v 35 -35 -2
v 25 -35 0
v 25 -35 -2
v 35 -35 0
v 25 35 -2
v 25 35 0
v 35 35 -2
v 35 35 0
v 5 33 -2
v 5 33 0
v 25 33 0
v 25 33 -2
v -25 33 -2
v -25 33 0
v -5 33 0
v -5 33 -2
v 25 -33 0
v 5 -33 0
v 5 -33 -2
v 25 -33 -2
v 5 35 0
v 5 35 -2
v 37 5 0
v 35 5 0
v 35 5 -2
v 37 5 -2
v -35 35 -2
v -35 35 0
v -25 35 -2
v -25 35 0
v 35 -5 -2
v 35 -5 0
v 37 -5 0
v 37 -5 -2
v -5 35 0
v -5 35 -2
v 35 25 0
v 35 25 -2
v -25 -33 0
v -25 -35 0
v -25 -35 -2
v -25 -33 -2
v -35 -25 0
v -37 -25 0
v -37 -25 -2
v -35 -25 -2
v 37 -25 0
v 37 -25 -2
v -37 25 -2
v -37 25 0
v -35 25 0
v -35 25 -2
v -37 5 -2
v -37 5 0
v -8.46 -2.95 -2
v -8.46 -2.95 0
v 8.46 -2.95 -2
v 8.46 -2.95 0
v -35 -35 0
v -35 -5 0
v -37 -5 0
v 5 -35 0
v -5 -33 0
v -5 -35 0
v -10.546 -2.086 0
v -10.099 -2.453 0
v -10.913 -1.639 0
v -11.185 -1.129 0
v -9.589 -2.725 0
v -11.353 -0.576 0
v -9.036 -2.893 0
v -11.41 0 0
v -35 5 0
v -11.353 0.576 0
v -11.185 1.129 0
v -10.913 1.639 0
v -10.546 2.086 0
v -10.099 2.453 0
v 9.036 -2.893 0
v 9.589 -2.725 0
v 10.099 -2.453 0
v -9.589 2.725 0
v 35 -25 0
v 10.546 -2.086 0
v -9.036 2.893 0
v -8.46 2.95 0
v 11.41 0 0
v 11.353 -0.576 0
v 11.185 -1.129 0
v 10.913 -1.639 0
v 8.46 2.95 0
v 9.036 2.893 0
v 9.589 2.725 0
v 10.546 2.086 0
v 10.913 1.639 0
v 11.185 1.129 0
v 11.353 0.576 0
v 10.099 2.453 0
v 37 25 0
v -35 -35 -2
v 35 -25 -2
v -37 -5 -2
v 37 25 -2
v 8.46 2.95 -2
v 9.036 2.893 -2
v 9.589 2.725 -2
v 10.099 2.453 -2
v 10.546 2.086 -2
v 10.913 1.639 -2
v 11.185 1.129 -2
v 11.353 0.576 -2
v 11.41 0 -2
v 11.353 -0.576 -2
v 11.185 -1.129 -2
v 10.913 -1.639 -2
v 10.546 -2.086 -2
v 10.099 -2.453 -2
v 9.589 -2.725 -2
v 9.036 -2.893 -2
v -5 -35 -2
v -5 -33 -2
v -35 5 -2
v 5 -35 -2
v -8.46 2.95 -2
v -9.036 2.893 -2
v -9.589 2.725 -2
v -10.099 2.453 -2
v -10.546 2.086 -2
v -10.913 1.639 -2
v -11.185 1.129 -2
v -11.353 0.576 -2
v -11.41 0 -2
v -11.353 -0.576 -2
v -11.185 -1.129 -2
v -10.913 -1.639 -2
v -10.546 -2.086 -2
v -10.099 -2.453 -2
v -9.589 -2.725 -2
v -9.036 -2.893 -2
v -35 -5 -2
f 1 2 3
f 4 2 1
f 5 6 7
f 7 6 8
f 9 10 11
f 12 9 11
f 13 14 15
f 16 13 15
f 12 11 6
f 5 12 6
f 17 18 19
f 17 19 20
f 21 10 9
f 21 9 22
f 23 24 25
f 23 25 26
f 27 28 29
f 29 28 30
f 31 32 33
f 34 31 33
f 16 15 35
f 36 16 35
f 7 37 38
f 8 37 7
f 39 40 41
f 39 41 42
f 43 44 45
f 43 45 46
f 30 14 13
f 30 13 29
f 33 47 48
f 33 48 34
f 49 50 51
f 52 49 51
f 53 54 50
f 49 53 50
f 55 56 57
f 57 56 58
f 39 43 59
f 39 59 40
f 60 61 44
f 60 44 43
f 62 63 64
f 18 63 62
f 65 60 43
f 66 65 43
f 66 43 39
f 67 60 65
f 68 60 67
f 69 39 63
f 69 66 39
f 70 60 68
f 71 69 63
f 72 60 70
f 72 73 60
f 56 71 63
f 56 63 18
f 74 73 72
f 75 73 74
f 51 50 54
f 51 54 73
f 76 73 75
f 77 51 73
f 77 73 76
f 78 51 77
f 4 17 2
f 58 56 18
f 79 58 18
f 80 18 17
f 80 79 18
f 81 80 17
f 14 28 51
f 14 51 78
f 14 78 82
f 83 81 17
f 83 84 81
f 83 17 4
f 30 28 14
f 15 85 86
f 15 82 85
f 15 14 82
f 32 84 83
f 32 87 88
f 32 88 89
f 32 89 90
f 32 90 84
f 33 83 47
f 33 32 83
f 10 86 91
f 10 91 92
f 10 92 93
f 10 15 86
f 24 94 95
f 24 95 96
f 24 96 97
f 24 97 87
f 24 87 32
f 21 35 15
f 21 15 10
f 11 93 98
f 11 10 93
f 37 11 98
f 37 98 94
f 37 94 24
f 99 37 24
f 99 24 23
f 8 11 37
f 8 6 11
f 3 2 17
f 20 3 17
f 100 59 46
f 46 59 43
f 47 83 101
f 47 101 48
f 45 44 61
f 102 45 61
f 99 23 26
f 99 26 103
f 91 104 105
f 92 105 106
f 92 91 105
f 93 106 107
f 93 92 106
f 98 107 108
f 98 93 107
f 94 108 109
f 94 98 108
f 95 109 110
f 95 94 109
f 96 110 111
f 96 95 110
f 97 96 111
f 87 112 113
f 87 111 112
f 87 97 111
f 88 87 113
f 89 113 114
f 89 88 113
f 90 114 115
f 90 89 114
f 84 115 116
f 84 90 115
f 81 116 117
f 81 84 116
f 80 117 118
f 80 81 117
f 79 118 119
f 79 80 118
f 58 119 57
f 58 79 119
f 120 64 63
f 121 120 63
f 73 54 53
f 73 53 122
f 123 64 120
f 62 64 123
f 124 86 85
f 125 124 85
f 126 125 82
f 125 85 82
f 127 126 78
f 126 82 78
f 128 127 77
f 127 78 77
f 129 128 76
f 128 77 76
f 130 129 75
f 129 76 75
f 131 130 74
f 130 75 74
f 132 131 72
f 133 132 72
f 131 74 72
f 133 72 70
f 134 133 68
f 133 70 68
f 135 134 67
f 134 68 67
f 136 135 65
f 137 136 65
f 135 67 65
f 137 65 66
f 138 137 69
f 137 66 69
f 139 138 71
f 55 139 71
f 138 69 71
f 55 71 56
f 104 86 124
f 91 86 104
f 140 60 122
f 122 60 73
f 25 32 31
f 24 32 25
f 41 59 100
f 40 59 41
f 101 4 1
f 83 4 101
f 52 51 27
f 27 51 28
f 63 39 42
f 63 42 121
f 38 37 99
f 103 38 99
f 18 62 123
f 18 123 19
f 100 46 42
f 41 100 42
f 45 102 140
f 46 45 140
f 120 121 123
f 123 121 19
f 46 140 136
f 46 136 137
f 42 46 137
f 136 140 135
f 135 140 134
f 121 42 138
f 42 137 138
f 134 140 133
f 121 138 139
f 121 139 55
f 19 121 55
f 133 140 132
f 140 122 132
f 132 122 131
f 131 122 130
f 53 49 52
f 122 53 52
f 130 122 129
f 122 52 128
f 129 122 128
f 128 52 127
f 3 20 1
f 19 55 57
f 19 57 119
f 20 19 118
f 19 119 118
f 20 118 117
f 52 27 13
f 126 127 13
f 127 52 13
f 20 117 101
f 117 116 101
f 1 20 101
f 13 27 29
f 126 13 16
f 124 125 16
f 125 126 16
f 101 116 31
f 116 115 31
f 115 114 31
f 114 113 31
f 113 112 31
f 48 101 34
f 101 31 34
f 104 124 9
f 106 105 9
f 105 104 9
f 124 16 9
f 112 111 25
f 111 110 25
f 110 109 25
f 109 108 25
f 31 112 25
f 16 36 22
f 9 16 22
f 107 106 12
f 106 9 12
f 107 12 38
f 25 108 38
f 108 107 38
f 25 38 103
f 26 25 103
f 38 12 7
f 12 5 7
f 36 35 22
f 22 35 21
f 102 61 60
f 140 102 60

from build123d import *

# Parameters (mm, degrees)
SKETCH1_W           = 70
SKETCH1_H           = 70
BOSS_EXTRUDE1_DEPTH = 2
SKETCH2_W           = 2
SKETCH2_H           = 20
BOSS_EXTRUDE2_DEPTH = 2
SKETCH3_W           = 20
SKETCH3_H           = 2
CUT_EXTRUDE1_DEPTH  = 2
SKETCH4_W           = 16.92
SKETCH4_H           = 5.9
CUT_EXTRUDE2_DEPTH  = 10


with BuildPart() as part:
    # Sketch1 → Boss-Extrude1 (new body)
    with BuildSketch(Plane.XY):
        Rectangle(SKETCH1_W, SKETCH1_H)
    extrude(amount=-BOSS_EXTRUDE1_DEPTH)

    # Sketch2 → Boss-Extrude2 (add)
    with BuildSketch(Plane.XY):
        with Locations((-36, 15)):
            Rectangle(SKETCH2_W, SKETCH2_H)
        with Locations((-36, -15)):
            Rectangle(SKETCH2_W, SKETCH2_H)
        with Locations((36, -15)):
            Rectangle(SKETCH2_W, SKETCH2_H)
        with Locations((36, 15)):
            Rectangle(SKETCH2_W, SKETCH2_H)
    extrude(amount=-BOSS_EXTRUDE2_DEPTH)

    # Sketch3 → Cut-Extrude1 (cut)
    with BuildSketch(Plane.XY):
        with Locations((-15, 34)):
            Rectangle(SKETCH3_W, SKETCH3_H)
        with Locations((15, 34)):
            Rectangle(SKETCH3_W, SKETCH3_H)
        with Locations((-15, -34)):
            Rectangle(SKETCH3_W, SKETCH3_H)
        with Locations((15, -34)):
            Rectangle(SKETCH3_W, SKETCH3_H)
    extrude(amount=-CUT_EXTRUDE1_DEPTH, mode=Mode.SUBTRACT)

    # Sketch4 → Cut-Extrude2 (cut)
    with BuildSketch(Plane.XY):
        Rectangle(SKETCH4_W, SKETCH4_H)
        with BuildLine():
            ThreePointArc((8.46, 2.95), (11.41, 0), (8.46, -2.95))
            Line((8.46, -2.95), (8.46, 2.95))
        make_face()
        with BuildLine():
            Line((-8.46, -2.95), (-8.46, 2.95))
            ThreePointArc((-8.46, 2.95), (-11.41, 0), (-8.46, -2.95))
        make_face()
    extrude(amount=-CUT_EXTRUDE2_DEPTH, mode=Mode.SUBTRACT)


solid = part.part
